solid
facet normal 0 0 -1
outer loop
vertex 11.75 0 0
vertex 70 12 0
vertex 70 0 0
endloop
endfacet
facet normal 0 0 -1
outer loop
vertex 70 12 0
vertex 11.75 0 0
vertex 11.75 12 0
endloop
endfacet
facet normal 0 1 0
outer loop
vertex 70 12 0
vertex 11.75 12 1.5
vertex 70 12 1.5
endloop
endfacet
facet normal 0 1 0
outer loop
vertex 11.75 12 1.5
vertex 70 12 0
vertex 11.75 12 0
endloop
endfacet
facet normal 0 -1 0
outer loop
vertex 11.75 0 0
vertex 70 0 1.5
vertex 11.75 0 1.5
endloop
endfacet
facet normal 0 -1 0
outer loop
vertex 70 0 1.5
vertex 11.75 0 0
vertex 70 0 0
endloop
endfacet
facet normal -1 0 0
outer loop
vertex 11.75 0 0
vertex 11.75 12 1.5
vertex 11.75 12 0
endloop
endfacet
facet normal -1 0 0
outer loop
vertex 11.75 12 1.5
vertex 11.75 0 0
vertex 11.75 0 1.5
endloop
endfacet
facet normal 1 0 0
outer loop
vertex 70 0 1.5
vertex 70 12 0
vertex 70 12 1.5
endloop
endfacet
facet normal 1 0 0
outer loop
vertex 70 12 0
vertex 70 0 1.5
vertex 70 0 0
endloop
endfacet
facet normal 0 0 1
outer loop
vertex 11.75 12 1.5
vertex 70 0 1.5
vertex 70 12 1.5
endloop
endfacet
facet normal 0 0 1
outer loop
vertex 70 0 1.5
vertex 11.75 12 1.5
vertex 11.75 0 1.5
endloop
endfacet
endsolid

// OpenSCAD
// 10-well comb for casting agarose gels, printed lying flat
// Units: mm

$fn = 64;

// Plate / spine
plate_len   = 70;   // spine length (X)
plate_wid   = 12;   // spine width (Y)
plate_thk   = 1.5;  // plate thickness (Z)

// Teeth
tooth_count = 10;   // number of wells
tooth_w     = 5.0;  // tooth width (X)
tooth_l     = 12;   // tooth length (Y)
tooth_pitch = 1.5;  // centre-to-centre spacing (X)

// Cut overlap
eps = 0.5;          // extension past cut faces

// Derived
row_len   = (tooth_count - 1) * tooth_pitch;  // span of 10 teeth
y0        = -plate_wid / 2 + tooth_l / 2;      // tooth base Y position

difference() {
    union() {
        // Spine
        translate([0, 0, 0])
            cube([plate_len, plate_wid, plate_thk]);

        // Teeth
        for (i = [0 : tooth_count - 1]) {
            x = -row_len / 2 + i * tooth_pitch;
            translate([x, y0, 0])
                cube([tooth_w, tooth_l, plate_thk + eps]);
        }
    }

    // Cut the well shapes (through the full thickness)
    for (i = [0 : tooth_count - 1]) {
        x = -row_len / 2 + i * tooth_pitch;
        translate([x, y0, -eps])
            cube([tooth_w, tooth_l, plate_thk + 2 * eps]);
    }
}
